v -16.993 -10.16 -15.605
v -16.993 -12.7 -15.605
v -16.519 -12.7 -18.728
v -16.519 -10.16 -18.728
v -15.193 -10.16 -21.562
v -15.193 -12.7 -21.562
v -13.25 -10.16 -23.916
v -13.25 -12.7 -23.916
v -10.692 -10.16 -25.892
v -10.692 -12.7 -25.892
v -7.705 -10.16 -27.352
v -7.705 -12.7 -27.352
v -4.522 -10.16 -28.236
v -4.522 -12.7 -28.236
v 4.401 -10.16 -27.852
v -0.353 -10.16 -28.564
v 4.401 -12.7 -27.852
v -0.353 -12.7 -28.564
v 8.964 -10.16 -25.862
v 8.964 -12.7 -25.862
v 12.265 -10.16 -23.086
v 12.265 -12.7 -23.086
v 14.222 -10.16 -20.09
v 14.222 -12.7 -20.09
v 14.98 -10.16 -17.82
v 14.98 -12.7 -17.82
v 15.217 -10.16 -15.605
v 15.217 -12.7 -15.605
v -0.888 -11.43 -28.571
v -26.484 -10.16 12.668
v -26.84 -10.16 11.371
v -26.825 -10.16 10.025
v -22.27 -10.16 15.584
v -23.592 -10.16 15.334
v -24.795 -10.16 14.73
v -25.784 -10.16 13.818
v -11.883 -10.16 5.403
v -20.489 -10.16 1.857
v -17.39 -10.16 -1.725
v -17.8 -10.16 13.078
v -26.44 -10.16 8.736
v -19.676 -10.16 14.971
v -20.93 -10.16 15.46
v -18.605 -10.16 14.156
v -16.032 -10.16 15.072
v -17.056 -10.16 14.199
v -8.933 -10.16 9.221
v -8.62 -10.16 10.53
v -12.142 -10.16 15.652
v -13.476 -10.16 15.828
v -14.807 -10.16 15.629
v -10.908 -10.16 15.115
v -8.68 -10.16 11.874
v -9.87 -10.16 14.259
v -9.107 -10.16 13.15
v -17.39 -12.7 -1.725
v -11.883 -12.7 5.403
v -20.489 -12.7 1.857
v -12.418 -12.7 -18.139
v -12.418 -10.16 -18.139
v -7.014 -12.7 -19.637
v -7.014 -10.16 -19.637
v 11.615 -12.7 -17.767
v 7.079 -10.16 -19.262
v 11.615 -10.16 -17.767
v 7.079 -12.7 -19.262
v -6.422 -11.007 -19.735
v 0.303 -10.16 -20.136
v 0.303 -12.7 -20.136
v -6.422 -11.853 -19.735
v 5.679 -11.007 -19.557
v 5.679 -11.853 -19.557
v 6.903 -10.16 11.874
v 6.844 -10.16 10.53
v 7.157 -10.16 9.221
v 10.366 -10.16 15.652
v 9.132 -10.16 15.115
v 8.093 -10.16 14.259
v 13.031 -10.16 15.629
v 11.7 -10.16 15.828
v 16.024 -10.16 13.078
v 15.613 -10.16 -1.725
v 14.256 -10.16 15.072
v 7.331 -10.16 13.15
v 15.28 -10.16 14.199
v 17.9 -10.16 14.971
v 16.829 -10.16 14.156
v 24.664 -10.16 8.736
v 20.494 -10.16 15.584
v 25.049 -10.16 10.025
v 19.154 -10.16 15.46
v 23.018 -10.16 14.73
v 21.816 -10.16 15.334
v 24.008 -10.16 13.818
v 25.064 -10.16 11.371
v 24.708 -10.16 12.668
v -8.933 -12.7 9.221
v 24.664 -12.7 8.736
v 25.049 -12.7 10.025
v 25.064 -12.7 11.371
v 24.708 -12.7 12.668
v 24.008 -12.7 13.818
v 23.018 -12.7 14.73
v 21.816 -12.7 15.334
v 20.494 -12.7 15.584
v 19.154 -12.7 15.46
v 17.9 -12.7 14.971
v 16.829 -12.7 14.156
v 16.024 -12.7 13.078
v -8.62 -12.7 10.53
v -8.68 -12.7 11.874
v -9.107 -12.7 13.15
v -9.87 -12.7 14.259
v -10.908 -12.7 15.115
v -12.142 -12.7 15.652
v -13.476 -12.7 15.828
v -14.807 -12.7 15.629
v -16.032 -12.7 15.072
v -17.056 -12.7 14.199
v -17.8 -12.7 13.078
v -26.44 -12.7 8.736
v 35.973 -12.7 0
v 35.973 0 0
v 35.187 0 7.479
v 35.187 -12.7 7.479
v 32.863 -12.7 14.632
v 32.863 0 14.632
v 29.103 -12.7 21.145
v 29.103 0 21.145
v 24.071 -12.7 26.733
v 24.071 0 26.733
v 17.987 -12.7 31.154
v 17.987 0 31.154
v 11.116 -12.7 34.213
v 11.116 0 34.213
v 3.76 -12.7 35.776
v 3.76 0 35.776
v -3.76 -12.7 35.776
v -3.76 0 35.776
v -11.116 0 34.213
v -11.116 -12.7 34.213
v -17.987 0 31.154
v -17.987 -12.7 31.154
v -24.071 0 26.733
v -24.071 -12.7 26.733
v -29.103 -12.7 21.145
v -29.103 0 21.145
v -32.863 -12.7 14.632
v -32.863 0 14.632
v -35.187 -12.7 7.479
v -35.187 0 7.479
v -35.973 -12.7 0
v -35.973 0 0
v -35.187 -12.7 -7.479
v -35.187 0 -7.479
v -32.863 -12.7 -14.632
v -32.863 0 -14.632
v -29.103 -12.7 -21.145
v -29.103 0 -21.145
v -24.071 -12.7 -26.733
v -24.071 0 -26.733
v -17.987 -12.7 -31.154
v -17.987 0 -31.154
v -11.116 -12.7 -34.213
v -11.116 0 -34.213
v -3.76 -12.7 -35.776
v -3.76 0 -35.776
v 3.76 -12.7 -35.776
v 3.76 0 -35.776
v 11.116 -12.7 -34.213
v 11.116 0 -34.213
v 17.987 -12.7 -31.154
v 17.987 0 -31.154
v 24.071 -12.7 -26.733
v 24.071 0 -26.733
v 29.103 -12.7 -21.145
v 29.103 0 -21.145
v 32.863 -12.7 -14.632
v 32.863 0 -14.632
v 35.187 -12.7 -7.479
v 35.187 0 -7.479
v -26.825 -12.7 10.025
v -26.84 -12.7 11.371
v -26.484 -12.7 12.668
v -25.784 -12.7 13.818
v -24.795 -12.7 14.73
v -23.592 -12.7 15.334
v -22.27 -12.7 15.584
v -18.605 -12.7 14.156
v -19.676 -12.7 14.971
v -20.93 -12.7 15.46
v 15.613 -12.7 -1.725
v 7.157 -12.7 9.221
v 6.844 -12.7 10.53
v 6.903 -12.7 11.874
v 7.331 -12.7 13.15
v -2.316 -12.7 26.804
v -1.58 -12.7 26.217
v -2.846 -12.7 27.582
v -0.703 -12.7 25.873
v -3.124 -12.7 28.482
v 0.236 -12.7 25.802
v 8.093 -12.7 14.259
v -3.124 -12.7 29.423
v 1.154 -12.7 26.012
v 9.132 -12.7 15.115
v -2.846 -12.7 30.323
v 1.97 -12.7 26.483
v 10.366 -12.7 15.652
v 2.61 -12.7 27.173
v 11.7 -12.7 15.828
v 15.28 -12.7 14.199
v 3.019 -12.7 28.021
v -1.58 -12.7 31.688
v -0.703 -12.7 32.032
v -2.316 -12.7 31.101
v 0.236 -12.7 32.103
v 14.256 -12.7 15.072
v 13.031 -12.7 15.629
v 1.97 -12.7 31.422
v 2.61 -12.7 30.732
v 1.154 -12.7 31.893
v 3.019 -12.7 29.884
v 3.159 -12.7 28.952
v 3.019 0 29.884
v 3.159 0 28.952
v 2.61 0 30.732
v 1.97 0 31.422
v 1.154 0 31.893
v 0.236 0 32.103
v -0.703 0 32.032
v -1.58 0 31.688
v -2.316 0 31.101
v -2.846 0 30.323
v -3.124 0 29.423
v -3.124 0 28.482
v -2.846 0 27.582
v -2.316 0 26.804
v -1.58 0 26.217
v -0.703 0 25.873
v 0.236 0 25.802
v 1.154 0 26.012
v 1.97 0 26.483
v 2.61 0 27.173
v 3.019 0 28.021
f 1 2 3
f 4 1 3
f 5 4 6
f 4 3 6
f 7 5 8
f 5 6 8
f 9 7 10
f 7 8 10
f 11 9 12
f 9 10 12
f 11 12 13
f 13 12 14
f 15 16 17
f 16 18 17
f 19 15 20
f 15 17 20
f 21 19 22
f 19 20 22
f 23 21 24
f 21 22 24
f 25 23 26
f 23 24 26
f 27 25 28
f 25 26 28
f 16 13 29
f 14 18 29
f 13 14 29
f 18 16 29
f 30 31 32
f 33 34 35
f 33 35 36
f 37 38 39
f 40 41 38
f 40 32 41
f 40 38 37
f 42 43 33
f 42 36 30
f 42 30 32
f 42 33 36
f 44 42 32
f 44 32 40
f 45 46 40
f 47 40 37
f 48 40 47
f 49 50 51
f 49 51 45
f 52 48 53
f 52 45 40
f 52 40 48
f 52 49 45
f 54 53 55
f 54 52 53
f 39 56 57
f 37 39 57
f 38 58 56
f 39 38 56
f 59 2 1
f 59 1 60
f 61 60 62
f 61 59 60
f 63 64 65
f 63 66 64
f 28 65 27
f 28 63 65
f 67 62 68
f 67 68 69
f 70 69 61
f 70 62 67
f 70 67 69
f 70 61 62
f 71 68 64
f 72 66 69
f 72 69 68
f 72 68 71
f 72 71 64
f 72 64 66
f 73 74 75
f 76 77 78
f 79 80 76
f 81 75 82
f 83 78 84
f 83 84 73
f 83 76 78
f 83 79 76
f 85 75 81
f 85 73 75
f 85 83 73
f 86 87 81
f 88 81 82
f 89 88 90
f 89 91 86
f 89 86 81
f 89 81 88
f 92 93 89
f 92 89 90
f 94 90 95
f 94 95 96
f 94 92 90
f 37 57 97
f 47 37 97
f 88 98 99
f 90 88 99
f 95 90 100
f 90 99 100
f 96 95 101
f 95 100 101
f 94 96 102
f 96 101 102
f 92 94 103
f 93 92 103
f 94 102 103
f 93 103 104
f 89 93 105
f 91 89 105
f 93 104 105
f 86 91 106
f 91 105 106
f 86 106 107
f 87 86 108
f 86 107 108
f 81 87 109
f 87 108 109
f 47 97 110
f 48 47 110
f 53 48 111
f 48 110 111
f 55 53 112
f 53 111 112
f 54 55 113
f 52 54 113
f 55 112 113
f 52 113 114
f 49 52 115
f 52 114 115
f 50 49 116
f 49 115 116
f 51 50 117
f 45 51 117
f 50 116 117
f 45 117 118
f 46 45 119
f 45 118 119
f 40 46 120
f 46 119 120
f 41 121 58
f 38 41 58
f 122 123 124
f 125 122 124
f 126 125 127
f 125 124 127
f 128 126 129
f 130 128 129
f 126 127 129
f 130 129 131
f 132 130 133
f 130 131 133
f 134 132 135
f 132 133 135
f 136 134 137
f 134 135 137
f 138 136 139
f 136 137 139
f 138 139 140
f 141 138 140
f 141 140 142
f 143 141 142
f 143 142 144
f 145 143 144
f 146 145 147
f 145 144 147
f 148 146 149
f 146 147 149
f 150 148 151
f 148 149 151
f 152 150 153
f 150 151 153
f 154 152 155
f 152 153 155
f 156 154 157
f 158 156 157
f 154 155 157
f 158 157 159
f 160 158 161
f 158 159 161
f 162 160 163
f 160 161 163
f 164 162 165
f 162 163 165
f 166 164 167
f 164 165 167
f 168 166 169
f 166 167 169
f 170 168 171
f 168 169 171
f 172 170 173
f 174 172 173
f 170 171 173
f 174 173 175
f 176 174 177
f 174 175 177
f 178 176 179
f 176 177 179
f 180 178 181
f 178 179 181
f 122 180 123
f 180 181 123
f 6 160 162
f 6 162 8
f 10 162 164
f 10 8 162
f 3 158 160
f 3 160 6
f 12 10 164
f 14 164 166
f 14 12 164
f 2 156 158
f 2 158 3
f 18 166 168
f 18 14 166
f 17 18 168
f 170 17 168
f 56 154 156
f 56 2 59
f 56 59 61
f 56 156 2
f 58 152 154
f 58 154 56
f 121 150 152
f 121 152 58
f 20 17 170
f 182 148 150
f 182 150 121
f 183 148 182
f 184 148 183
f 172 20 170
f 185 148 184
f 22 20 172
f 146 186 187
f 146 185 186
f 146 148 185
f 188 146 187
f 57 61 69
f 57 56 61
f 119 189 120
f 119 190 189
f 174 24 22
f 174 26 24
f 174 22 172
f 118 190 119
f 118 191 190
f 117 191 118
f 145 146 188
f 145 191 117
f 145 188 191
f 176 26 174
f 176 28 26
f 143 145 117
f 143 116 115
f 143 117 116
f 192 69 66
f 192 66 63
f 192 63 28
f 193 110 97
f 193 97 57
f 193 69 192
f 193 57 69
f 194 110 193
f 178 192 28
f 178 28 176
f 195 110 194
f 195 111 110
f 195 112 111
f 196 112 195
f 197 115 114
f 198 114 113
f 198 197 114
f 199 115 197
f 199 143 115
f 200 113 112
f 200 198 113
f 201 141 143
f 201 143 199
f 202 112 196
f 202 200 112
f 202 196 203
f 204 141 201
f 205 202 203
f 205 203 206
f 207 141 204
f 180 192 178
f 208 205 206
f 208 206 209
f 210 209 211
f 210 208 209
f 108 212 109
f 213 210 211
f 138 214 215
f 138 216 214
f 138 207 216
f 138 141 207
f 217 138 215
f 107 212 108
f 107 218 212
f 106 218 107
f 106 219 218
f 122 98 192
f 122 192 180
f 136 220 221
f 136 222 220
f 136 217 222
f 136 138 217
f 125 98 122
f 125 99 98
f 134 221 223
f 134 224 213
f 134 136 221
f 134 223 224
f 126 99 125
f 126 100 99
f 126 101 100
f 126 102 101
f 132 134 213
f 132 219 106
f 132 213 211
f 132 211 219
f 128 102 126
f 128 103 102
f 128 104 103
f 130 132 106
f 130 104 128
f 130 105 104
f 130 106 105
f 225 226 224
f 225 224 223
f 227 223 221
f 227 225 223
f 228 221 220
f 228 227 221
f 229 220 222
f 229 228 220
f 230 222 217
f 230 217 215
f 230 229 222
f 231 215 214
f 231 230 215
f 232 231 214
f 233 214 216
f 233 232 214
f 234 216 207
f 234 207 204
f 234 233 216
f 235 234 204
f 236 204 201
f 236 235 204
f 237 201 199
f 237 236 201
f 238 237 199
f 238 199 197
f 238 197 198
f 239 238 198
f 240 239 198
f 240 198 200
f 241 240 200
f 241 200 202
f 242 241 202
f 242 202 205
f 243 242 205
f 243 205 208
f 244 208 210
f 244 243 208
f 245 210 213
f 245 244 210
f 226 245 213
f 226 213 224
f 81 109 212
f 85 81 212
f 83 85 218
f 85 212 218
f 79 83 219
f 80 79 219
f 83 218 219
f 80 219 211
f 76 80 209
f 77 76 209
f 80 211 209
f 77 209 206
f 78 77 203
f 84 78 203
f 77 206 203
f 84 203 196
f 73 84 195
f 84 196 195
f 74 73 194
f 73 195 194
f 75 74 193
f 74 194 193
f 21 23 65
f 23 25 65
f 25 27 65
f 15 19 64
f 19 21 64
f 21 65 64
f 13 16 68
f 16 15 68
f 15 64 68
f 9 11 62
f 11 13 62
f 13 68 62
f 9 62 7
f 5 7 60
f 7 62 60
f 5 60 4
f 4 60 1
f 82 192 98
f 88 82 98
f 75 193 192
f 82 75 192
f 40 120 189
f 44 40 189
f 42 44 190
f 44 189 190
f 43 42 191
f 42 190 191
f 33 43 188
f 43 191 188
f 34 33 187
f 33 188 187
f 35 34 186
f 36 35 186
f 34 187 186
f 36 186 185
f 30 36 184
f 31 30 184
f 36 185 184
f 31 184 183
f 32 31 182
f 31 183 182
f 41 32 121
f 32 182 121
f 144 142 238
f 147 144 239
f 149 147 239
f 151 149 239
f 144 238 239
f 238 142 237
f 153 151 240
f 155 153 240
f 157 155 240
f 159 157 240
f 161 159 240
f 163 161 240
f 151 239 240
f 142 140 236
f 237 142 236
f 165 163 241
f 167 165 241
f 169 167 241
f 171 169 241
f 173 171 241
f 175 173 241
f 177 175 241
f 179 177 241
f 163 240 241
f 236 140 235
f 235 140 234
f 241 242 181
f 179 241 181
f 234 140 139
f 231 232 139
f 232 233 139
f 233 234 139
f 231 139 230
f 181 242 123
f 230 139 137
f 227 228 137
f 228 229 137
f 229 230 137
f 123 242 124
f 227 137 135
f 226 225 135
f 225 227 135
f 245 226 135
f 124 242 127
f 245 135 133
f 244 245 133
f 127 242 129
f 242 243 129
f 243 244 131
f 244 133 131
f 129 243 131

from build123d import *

# Parameters (mm, degrees)
F0_R     = 35.9731805371
F1_DEPTH = 12.7
F3_DEPTH = 2.54
F4_R     = 3.1591269053
F5_DEPTH = 12.7


with BuildPart() as f1:
    # F0 (on Front) → F1 (new body)
    with BuildSketch(Plane.XZ):
        Circle(F0_R)
    extrude(amount=F1_DEPTH)

    # F2 (on face) → F3 (cut)
    with BuildSketch(Plane.XZ.offset(12.7)):
        with BuildLine():
            add(Edge.make_bspline(
                [(-16.9929389652, -15.6046478078), (-8.5501303198, -22.0675654258), (8.323411948, -21.2654638787), (15.2166548375, -15.6046478078)],
                knots=[0, 0, 0, 0, 0.2892568057, 0.2892568057, 0.2892568057, 0.2892568057], degree=3))
            add(Edge.make_bspline(
                [(-16.9929389652, -15.6046478078), (-16.9929389652, -28.5709049037), (-0.8881420638, -28.5709049037), (15.2166548375, -28.5709049037), (15.2166548375, -15.6046478078)],
                knots=[3.1415926536, 3.1415926536, 3.1415926536, 4.7123889804, 4.7123889804, 6.2831853072, 6.2831853072, 6.2831853072], degree=2, weights=[1, 0.7071067812, 1, 0.7071067812, 1]))
        make_face()
        with BuildLine():
            Line((-26.4401481881, 8.735650257), (-20.4888275084, 1.8568773465))
            add(Edge.make_bspline(
                [(-11.8826347663, 5.4031915978), (-15.0818594553, 5.0135593832), (-18.2480697552, 3.9656430572), (-20.2552859644, 2.1019215063), (-20.4888275084, 1.8568773465)],
                knots=[0.7025224358, 0.7025224358, 0.7025224358, 0.7025224358, 0.7815743868, 0.7928961202, 0.7928961202, 0.7928961202, 0.7928961202], degree=3))
            Line((-11.8826347663, 5.4031915978), (-8.9330095374, 9.2211581919))
            ThreePointArc((-8.9330095374, 9.2211581919), (-11.5064602723, 15.4265381827), (-17.8002578016, 13.0776017904))
            ThreePointArc((-17.8002578016, 13.0776017904), (-24.2145633889, 15.0741170918), (-26.4401481881, 8.735650257))
        make_face()
        with BuildLine():
            add(Edge.make_bspline(
                [(-11.8826347663, 5.4031915978), (-15.0818594553, 5.0135593832), (-18.2480697552, 3.9656430572), (-20.2552859644, 2.1019215063), (-20.4888275084, 1.8568773465)],
                knots=[0.7025224358, 0.7025224358, 0.7025224358, 0.7025224358, 0.7815743868, 0.7928961202, 0.7928961202, 0.7928961202, 0.7928961202], degree=3))
            Line((-20.4888275084, 1.8568773465), (-17.3897475746, -1.7251623794))
            Line((-17.3897475746, -1.7251623794), (-11.8826347663, 5.4031915978))
        make_face()
        with BuildLine():
            ThreePointArc((24.6638640604, 8.735650257), (22.4382792612, 15.0741170918), (16.0239736739, 13.0776017904))
            ThreePointArc((16.0239736739, 13.0776017904), (9.7301761446, 15.4265381827), (7.1567254097, 9.2211581919))
            Line((7.1567254097, 9.2211581919), (15.6134634469, -1.7251623794))
            Line((15.6134634469, -1.7251623794), (24.6638640604, 8.735650257))
        make_face()
    extrude(amount=-F3_DEPTH, mode=Mode.SUBTRACT)

    # F4 (on Front) → F5 (cut)
    with BuildSketch(Plane.XZ):
        with Locations((0, 28.9524216205)):
            Circle(F4_R)
    extrude(amount=F5_DEPTH, mode=Mode.SUBTRACT)


solid = f1.part
